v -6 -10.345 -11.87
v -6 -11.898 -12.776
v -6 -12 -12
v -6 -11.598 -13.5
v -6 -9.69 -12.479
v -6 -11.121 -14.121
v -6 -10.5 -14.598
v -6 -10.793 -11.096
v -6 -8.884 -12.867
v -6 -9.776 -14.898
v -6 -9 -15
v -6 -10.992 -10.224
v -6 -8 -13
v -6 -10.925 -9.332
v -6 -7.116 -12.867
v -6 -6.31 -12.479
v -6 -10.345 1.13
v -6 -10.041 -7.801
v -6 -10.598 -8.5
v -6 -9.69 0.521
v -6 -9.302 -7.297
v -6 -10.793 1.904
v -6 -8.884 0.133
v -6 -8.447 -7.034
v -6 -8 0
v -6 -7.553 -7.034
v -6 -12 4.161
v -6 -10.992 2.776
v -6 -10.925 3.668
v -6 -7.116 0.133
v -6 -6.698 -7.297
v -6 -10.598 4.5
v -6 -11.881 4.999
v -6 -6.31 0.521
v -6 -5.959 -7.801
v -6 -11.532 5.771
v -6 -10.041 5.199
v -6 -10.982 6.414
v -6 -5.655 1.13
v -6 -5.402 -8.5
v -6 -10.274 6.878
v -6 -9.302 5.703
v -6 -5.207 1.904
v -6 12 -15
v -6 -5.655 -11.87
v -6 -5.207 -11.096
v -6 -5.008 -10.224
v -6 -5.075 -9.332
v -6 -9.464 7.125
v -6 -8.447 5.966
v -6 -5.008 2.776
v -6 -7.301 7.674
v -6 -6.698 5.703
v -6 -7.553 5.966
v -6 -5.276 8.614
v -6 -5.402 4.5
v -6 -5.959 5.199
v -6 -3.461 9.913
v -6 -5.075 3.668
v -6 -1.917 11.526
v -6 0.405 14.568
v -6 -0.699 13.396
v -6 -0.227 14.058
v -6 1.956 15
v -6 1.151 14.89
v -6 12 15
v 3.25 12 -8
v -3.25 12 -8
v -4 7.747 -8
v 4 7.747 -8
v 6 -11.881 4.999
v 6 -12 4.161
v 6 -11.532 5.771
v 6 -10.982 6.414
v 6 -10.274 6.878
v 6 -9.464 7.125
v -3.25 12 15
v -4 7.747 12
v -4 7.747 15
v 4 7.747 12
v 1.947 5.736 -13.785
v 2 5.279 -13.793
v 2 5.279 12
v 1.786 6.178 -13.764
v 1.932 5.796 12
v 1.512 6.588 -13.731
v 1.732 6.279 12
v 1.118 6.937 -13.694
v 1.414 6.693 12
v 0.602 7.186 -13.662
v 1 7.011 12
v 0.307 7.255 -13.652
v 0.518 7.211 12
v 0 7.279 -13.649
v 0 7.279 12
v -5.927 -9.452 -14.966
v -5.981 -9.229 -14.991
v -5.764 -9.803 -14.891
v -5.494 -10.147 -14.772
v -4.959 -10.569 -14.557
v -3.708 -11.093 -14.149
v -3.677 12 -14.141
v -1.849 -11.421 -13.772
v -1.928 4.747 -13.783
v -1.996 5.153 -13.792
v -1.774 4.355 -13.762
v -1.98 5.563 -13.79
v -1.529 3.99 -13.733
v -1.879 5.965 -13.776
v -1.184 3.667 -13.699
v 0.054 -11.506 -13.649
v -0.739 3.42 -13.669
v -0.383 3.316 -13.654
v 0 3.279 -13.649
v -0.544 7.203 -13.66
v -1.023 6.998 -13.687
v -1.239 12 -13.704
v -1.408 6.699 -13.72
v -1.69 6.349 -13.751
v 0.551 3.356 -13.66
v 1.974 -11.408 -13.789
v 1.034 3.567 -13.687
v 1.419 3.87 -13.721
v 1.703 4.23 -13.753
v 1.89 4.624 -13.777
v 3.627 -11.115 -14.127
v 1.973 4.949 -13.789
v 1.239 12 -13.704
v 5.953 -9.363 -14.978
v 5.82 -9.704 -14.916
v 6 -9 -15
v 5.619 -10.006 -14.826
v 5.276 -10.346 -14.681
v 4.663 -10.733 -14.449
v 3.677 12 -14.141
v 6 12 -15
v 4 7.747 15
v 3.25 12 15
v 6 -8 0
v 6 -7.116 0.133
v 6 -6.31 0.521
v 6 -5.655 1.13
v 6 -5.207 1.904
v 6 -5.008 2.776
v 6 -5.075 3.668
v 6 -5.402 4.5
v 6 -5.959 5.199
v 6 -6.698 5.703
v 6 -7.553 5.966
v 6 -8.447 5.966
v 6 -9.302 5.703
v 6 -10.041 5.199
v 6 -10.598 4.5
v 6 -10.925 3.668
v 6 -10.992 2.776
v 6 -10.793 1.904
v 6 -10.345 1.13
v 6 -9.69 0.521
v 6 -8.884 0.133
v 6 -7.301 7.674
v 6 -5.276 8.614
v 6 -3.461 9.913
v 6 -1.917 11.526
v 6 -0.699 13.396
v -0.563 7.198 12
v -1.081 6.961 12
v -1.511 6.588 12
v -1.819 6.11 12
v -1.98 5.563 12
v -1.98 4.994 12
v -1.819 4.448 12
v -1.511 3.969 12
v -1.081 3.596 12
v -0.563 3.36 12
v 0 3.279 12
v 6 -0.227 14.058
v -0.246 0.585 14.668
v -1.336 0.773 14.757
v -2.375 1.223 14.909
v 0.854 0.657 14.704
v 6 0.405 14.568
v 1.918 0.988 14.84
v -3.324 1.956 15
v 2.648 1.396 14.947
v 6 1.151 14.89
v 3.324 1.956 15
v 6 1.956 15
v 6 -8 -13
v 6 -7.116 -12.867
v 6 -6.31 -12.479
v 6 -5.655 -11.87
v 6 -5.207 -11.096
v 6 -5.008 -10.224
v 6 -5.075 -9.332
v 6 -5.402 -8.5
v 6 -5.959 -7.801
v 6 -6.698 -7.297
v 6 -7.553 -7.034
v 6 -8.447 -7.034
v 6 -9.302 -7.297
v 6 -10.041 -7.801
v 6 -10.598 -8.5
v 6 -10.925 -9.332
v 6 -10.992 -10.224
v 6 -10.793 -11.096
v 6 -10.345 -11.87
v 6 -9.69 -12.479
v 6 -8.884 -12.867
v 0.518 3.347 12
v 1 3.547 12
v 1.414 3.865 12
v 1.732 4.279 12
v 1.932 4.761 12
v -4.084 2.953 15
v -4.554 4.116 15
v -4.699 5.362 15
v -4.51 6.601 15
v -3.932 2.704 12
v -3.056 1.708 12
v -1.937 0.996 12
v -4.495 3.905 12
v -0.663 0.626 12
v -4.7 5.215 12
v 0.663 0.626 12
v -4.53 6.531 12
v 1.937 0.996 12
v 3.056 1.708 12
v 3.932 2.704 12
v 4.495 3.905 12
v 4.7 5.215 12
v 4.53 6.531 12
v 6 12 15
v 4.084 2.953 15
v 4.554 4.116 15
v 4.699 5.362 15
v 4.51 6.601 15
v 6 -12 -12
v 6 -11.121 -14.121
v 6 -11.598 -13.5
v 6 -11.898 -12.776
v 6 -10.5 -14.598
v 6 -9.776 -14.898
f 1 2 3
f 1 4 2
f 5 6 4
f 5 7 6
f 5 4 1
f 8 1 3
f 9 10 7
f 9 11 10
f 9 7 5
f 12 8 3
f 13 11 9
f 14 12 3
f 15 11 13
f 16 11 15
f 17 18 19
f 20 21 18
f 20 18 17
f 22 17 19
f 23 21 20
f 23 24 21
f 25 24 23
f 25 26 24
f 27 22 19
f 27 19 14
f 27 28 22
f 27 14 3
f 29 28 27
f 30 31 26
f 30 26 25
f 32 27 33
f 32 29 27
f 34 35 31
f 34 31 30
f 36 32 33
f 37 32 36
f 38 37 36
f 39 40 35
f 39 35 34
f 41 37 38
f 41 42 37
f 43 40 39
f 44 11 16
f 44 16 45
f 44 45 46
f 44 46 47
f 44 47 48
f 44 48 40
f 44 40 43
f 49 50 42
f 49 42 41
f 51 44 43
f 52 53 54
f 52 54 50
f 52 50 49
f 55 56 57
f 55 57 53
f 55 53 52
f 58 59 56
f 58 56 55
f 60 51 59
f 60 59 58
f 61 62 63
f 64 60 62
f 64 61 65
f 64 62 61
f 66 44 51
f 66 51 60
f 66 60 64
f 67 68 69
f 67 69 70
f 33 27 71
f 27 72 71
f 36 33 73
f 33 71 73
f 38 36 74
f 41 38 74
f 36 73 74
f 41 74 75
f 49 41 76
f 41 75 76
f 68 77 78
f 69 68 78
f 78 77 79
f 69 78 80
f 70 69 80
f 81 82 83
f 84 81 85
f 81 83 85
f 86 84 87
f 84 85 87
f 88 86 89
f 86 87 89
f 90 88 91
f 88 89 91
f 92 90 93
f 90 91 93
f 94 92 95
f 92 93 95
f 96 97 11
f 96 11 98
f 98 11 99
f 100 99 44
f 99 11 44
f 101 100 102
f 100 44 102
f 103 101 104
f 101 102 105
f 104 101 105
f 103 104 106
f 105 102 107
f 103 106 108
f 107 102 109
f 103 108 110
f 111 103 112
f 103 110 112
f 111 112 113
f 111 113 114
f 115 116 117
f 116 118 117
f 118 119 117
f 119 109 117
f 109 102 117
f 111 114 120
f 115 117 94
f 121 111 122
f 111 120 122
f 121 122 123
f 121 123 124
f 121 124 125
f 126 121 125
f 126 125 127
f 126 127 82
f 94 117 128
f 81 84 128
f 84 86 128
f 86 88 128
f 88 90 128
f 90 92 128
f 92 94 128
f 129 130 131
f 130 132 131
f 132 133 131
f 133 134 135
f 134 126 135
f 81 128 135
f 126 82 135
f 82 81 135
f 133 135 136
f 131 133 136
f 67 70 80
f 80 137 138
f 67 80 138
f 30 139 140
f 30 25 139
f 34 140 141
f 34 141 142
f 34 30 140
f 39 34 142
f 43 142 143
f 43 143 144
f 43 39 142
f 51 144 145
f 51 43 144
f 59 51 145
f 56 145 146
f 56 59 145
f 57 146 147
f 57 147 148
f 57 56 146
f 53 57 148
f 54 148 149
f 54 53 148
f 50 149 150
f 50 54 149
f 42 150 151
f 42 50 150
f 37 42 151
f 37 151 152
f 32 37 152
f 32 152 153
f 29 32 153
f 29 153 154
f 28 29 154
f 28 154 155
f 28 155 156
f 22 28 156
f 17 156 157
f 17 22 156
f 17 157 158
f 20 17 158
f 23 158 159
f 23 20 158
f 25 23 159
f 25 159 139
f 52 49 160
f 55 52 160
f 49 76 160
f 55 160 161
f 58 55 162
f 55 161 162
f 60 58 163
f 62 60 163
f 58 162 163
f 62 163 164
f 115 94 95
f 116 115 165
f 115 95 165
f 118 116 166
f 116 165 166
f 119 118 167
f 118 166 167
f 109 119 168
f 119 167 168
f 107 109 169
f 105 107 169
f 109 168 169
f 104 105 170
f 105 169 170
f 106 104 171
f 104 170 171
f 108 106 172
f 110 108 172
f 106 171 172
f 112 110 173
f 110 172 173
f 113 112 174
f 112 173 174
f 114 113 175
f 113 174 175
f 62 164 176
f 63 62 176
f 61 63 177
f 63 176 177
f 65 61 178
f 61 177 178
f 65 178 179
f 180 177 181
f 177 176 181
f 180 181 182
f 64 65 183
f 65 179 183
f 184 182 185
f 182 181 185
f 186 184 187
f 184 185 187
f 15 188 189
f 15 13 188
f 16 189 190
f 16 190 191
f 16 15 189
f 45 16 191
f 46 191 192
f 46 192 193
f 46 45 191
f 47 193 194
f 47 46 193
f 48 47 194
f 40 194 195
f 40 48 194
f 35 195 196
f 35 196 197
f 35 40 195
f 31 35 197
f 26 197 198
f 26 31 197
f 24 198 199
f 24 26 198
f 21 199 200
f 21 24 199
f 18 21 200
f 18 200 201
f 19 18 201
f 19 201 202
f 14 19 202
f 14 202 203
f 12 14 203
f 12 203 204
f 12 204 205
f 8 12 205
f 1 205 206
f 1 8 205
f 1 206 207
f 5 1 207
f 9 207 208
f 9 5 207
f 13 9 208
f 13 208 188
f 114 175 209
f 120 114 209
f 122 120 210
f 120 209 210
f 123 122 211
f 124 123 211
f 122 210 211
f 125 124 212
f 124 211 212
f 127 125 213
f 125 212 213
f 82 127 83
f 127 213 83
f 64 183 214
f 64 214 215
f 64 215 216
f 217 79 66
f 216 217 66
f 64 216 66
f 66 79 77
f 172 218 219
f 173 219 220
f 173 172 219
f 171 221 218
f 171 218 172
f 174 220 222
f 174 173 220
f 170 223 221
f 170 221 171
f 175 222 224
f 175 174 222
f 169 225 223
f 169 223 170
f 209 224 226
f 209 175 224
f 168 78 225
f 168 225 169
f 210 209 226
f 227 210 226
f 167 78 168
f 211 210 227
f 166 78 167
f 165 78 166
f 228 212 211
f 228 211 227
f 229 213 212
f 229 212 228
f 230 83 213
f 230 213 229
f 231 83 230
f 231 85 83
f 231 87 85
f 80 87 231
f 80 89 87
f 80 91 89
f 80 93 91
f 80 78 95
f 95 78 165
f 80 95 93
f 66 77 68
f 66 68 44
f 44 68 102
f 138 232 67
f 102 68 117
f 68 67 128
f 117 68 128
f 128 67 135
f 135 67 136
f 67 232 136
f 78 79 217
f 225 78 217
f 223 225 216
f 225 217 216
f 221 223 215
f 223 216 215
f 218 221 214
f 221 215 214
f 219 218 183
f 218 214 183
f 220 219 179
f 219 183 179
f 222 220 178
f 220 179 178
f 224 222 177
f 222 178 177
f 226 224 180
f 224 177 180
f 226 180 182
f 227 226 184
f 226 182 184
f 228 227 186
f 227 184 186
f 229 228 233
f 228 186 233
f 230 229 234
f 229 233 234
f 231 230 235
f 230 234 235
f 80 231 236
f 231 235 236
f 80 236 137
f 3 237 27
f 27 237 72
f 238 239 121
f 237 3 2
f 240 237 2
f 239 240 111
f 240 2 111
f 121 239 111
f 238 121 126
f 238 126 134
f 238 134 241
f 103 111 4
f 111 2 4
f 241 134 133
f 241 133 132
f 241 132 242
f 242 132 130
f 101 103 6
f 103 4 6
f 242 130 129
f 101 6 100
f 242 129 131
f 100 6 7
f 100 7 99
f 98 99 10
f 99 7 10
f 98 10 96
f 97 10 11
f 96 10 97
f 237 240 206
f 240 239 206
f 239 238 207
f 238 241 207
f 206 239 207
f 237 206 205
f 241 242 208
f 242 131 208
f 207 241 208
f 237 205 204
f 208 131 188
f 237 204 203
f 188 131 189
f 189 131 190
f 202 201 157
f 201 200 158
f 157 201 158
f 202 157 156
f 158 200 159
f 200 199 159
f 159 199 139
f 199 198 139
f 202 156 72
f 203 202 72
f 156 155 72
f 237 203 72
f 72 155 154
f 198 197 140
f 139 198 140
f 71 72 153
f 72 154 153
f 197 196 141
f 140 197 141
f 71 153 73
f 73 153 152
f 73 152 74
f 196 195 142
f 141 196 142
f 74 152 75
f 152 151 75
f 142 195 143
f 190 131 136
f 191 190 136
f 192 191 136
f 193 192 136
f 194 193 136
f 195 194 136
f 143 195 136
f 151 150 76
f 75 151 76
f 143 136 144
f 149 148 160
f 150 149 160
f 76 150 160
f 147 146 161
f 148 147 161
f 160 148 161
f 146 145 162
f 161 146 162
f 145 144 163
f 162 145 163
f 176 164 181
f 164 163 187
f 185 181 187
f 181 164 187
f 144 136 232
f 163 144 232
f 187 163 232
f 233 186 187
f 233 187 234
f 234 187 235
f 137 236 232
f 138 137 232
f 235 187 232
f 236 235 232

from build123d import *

# Parameters (mm, degrees)
SKETCH1_R           = 3
BOSS_EXTRUDE1_DEPTH = 6
FILLET1_R           = 3
SKETCH2_R           = 2
CUT_EXTRUDE1_DEPTH  = 33.86335345
CUT_EXTRUDE2_DEPTH  = 23
SKETCH2_4_R         = 2
CUT_EXTRUDE3_DEPTH  = 3
CUT_EXTRUDE4_DEPTH  = 29.930952356


with BuildPart() as part:
    # Sketch1 → Boss-Extrude1 (new, symmetric)
    with BuildSketch(Plane(origin=(0, 0, 0), x_dir=(0, 0, -1), z_dir=(1, 0, 0))):
        with BuildLine():
            Line((-15, 12), (15, 12))
            Line((15, 12), (15, -12))
            Line((15, -12), (-7, -12))
            ThreePointArc((-7, -12), (-8.996142529, -4.664095019), (-15, 0))
            Line((-15, 0), (-15, 12))
        make_face()
        with Locations((-3, -8)):
            Circle(SKETCH1_R, mode=Mode.SUBTRACT)
        with Locations((10, -8)):
            Circle(SKETCH1_R, mode=Mode.SUBTRACT)
    extrude(amount=BOSS_EXTRUDE1_DEPTH, both=True)

    # Fillet1
    fillet1_edges = [part.edges().sort_by_distance(p)[0] for p in [
        (0, -12, -15),
        (0, -12, 7),
        (0, 0, 15),
    ]]
    fillet(fillet1_edges, radius=FILLET1_R)

    # Sketch2 → Cut-Extrude1 (cut, through all)
    with BuildSketch(Plane.XY.offset(15)):
        with Locations((0, 5.278746099)):
            Circle(SKETCH2_R)
    extrude(amount=-CUT_EXTRUDE1_DEPTH, mode=Mode.SUBTRACT)

    # Sketch2<3> → Cut-Extrude2 (cut)
    with BuildSketch(Plane.XY.offset(15)):
        Polygon((3.25, 12), (-3.25, 12), (-4, 7.746538635), (4, 7.746538635), align=None)
    extrude(amount=-CUT_EXTRUDE2_DEPTH, mode=Mode.SUBTRACT)

    # Sketch2<4> → Cut-Extrude3 (cut)
    with BuildSketch(Plane.XY.offset(15)):
        with BuildLine():
            Line((4, 7.746538635), (-4, 7.746538635))
            ThreePointArc((-4, 7.746538635), (0, 0.578746099), (4, 7.746538635))
        make_face()
        with Locations((0, 5.278746099)):
            Circle(SKETCH2_4_R, mode=Mode.SUBTRACT)
    extrude(amount=-CUT_EXTRUDE3_DEPTH, mode=Mode.SUBTRACT)

    # Sketch3 → Cut-Extrude4 (cut, through all)
    with BuildSketch(Plane(origin=(0, 12, 0), x_dir=(1, 0, 0), z_dir=(0, 1, 0))):
        with BuildLine():
            Line((6, 15), (-6, 15))
            ThreePointArc((-6, 15), (0, 13.649110641), (6, 15))
        make_face()
    extrude(amount=-CUT_EXTRUDE4_DEPTH, mode=Mode.SUBTRACT)


solid = part.part
